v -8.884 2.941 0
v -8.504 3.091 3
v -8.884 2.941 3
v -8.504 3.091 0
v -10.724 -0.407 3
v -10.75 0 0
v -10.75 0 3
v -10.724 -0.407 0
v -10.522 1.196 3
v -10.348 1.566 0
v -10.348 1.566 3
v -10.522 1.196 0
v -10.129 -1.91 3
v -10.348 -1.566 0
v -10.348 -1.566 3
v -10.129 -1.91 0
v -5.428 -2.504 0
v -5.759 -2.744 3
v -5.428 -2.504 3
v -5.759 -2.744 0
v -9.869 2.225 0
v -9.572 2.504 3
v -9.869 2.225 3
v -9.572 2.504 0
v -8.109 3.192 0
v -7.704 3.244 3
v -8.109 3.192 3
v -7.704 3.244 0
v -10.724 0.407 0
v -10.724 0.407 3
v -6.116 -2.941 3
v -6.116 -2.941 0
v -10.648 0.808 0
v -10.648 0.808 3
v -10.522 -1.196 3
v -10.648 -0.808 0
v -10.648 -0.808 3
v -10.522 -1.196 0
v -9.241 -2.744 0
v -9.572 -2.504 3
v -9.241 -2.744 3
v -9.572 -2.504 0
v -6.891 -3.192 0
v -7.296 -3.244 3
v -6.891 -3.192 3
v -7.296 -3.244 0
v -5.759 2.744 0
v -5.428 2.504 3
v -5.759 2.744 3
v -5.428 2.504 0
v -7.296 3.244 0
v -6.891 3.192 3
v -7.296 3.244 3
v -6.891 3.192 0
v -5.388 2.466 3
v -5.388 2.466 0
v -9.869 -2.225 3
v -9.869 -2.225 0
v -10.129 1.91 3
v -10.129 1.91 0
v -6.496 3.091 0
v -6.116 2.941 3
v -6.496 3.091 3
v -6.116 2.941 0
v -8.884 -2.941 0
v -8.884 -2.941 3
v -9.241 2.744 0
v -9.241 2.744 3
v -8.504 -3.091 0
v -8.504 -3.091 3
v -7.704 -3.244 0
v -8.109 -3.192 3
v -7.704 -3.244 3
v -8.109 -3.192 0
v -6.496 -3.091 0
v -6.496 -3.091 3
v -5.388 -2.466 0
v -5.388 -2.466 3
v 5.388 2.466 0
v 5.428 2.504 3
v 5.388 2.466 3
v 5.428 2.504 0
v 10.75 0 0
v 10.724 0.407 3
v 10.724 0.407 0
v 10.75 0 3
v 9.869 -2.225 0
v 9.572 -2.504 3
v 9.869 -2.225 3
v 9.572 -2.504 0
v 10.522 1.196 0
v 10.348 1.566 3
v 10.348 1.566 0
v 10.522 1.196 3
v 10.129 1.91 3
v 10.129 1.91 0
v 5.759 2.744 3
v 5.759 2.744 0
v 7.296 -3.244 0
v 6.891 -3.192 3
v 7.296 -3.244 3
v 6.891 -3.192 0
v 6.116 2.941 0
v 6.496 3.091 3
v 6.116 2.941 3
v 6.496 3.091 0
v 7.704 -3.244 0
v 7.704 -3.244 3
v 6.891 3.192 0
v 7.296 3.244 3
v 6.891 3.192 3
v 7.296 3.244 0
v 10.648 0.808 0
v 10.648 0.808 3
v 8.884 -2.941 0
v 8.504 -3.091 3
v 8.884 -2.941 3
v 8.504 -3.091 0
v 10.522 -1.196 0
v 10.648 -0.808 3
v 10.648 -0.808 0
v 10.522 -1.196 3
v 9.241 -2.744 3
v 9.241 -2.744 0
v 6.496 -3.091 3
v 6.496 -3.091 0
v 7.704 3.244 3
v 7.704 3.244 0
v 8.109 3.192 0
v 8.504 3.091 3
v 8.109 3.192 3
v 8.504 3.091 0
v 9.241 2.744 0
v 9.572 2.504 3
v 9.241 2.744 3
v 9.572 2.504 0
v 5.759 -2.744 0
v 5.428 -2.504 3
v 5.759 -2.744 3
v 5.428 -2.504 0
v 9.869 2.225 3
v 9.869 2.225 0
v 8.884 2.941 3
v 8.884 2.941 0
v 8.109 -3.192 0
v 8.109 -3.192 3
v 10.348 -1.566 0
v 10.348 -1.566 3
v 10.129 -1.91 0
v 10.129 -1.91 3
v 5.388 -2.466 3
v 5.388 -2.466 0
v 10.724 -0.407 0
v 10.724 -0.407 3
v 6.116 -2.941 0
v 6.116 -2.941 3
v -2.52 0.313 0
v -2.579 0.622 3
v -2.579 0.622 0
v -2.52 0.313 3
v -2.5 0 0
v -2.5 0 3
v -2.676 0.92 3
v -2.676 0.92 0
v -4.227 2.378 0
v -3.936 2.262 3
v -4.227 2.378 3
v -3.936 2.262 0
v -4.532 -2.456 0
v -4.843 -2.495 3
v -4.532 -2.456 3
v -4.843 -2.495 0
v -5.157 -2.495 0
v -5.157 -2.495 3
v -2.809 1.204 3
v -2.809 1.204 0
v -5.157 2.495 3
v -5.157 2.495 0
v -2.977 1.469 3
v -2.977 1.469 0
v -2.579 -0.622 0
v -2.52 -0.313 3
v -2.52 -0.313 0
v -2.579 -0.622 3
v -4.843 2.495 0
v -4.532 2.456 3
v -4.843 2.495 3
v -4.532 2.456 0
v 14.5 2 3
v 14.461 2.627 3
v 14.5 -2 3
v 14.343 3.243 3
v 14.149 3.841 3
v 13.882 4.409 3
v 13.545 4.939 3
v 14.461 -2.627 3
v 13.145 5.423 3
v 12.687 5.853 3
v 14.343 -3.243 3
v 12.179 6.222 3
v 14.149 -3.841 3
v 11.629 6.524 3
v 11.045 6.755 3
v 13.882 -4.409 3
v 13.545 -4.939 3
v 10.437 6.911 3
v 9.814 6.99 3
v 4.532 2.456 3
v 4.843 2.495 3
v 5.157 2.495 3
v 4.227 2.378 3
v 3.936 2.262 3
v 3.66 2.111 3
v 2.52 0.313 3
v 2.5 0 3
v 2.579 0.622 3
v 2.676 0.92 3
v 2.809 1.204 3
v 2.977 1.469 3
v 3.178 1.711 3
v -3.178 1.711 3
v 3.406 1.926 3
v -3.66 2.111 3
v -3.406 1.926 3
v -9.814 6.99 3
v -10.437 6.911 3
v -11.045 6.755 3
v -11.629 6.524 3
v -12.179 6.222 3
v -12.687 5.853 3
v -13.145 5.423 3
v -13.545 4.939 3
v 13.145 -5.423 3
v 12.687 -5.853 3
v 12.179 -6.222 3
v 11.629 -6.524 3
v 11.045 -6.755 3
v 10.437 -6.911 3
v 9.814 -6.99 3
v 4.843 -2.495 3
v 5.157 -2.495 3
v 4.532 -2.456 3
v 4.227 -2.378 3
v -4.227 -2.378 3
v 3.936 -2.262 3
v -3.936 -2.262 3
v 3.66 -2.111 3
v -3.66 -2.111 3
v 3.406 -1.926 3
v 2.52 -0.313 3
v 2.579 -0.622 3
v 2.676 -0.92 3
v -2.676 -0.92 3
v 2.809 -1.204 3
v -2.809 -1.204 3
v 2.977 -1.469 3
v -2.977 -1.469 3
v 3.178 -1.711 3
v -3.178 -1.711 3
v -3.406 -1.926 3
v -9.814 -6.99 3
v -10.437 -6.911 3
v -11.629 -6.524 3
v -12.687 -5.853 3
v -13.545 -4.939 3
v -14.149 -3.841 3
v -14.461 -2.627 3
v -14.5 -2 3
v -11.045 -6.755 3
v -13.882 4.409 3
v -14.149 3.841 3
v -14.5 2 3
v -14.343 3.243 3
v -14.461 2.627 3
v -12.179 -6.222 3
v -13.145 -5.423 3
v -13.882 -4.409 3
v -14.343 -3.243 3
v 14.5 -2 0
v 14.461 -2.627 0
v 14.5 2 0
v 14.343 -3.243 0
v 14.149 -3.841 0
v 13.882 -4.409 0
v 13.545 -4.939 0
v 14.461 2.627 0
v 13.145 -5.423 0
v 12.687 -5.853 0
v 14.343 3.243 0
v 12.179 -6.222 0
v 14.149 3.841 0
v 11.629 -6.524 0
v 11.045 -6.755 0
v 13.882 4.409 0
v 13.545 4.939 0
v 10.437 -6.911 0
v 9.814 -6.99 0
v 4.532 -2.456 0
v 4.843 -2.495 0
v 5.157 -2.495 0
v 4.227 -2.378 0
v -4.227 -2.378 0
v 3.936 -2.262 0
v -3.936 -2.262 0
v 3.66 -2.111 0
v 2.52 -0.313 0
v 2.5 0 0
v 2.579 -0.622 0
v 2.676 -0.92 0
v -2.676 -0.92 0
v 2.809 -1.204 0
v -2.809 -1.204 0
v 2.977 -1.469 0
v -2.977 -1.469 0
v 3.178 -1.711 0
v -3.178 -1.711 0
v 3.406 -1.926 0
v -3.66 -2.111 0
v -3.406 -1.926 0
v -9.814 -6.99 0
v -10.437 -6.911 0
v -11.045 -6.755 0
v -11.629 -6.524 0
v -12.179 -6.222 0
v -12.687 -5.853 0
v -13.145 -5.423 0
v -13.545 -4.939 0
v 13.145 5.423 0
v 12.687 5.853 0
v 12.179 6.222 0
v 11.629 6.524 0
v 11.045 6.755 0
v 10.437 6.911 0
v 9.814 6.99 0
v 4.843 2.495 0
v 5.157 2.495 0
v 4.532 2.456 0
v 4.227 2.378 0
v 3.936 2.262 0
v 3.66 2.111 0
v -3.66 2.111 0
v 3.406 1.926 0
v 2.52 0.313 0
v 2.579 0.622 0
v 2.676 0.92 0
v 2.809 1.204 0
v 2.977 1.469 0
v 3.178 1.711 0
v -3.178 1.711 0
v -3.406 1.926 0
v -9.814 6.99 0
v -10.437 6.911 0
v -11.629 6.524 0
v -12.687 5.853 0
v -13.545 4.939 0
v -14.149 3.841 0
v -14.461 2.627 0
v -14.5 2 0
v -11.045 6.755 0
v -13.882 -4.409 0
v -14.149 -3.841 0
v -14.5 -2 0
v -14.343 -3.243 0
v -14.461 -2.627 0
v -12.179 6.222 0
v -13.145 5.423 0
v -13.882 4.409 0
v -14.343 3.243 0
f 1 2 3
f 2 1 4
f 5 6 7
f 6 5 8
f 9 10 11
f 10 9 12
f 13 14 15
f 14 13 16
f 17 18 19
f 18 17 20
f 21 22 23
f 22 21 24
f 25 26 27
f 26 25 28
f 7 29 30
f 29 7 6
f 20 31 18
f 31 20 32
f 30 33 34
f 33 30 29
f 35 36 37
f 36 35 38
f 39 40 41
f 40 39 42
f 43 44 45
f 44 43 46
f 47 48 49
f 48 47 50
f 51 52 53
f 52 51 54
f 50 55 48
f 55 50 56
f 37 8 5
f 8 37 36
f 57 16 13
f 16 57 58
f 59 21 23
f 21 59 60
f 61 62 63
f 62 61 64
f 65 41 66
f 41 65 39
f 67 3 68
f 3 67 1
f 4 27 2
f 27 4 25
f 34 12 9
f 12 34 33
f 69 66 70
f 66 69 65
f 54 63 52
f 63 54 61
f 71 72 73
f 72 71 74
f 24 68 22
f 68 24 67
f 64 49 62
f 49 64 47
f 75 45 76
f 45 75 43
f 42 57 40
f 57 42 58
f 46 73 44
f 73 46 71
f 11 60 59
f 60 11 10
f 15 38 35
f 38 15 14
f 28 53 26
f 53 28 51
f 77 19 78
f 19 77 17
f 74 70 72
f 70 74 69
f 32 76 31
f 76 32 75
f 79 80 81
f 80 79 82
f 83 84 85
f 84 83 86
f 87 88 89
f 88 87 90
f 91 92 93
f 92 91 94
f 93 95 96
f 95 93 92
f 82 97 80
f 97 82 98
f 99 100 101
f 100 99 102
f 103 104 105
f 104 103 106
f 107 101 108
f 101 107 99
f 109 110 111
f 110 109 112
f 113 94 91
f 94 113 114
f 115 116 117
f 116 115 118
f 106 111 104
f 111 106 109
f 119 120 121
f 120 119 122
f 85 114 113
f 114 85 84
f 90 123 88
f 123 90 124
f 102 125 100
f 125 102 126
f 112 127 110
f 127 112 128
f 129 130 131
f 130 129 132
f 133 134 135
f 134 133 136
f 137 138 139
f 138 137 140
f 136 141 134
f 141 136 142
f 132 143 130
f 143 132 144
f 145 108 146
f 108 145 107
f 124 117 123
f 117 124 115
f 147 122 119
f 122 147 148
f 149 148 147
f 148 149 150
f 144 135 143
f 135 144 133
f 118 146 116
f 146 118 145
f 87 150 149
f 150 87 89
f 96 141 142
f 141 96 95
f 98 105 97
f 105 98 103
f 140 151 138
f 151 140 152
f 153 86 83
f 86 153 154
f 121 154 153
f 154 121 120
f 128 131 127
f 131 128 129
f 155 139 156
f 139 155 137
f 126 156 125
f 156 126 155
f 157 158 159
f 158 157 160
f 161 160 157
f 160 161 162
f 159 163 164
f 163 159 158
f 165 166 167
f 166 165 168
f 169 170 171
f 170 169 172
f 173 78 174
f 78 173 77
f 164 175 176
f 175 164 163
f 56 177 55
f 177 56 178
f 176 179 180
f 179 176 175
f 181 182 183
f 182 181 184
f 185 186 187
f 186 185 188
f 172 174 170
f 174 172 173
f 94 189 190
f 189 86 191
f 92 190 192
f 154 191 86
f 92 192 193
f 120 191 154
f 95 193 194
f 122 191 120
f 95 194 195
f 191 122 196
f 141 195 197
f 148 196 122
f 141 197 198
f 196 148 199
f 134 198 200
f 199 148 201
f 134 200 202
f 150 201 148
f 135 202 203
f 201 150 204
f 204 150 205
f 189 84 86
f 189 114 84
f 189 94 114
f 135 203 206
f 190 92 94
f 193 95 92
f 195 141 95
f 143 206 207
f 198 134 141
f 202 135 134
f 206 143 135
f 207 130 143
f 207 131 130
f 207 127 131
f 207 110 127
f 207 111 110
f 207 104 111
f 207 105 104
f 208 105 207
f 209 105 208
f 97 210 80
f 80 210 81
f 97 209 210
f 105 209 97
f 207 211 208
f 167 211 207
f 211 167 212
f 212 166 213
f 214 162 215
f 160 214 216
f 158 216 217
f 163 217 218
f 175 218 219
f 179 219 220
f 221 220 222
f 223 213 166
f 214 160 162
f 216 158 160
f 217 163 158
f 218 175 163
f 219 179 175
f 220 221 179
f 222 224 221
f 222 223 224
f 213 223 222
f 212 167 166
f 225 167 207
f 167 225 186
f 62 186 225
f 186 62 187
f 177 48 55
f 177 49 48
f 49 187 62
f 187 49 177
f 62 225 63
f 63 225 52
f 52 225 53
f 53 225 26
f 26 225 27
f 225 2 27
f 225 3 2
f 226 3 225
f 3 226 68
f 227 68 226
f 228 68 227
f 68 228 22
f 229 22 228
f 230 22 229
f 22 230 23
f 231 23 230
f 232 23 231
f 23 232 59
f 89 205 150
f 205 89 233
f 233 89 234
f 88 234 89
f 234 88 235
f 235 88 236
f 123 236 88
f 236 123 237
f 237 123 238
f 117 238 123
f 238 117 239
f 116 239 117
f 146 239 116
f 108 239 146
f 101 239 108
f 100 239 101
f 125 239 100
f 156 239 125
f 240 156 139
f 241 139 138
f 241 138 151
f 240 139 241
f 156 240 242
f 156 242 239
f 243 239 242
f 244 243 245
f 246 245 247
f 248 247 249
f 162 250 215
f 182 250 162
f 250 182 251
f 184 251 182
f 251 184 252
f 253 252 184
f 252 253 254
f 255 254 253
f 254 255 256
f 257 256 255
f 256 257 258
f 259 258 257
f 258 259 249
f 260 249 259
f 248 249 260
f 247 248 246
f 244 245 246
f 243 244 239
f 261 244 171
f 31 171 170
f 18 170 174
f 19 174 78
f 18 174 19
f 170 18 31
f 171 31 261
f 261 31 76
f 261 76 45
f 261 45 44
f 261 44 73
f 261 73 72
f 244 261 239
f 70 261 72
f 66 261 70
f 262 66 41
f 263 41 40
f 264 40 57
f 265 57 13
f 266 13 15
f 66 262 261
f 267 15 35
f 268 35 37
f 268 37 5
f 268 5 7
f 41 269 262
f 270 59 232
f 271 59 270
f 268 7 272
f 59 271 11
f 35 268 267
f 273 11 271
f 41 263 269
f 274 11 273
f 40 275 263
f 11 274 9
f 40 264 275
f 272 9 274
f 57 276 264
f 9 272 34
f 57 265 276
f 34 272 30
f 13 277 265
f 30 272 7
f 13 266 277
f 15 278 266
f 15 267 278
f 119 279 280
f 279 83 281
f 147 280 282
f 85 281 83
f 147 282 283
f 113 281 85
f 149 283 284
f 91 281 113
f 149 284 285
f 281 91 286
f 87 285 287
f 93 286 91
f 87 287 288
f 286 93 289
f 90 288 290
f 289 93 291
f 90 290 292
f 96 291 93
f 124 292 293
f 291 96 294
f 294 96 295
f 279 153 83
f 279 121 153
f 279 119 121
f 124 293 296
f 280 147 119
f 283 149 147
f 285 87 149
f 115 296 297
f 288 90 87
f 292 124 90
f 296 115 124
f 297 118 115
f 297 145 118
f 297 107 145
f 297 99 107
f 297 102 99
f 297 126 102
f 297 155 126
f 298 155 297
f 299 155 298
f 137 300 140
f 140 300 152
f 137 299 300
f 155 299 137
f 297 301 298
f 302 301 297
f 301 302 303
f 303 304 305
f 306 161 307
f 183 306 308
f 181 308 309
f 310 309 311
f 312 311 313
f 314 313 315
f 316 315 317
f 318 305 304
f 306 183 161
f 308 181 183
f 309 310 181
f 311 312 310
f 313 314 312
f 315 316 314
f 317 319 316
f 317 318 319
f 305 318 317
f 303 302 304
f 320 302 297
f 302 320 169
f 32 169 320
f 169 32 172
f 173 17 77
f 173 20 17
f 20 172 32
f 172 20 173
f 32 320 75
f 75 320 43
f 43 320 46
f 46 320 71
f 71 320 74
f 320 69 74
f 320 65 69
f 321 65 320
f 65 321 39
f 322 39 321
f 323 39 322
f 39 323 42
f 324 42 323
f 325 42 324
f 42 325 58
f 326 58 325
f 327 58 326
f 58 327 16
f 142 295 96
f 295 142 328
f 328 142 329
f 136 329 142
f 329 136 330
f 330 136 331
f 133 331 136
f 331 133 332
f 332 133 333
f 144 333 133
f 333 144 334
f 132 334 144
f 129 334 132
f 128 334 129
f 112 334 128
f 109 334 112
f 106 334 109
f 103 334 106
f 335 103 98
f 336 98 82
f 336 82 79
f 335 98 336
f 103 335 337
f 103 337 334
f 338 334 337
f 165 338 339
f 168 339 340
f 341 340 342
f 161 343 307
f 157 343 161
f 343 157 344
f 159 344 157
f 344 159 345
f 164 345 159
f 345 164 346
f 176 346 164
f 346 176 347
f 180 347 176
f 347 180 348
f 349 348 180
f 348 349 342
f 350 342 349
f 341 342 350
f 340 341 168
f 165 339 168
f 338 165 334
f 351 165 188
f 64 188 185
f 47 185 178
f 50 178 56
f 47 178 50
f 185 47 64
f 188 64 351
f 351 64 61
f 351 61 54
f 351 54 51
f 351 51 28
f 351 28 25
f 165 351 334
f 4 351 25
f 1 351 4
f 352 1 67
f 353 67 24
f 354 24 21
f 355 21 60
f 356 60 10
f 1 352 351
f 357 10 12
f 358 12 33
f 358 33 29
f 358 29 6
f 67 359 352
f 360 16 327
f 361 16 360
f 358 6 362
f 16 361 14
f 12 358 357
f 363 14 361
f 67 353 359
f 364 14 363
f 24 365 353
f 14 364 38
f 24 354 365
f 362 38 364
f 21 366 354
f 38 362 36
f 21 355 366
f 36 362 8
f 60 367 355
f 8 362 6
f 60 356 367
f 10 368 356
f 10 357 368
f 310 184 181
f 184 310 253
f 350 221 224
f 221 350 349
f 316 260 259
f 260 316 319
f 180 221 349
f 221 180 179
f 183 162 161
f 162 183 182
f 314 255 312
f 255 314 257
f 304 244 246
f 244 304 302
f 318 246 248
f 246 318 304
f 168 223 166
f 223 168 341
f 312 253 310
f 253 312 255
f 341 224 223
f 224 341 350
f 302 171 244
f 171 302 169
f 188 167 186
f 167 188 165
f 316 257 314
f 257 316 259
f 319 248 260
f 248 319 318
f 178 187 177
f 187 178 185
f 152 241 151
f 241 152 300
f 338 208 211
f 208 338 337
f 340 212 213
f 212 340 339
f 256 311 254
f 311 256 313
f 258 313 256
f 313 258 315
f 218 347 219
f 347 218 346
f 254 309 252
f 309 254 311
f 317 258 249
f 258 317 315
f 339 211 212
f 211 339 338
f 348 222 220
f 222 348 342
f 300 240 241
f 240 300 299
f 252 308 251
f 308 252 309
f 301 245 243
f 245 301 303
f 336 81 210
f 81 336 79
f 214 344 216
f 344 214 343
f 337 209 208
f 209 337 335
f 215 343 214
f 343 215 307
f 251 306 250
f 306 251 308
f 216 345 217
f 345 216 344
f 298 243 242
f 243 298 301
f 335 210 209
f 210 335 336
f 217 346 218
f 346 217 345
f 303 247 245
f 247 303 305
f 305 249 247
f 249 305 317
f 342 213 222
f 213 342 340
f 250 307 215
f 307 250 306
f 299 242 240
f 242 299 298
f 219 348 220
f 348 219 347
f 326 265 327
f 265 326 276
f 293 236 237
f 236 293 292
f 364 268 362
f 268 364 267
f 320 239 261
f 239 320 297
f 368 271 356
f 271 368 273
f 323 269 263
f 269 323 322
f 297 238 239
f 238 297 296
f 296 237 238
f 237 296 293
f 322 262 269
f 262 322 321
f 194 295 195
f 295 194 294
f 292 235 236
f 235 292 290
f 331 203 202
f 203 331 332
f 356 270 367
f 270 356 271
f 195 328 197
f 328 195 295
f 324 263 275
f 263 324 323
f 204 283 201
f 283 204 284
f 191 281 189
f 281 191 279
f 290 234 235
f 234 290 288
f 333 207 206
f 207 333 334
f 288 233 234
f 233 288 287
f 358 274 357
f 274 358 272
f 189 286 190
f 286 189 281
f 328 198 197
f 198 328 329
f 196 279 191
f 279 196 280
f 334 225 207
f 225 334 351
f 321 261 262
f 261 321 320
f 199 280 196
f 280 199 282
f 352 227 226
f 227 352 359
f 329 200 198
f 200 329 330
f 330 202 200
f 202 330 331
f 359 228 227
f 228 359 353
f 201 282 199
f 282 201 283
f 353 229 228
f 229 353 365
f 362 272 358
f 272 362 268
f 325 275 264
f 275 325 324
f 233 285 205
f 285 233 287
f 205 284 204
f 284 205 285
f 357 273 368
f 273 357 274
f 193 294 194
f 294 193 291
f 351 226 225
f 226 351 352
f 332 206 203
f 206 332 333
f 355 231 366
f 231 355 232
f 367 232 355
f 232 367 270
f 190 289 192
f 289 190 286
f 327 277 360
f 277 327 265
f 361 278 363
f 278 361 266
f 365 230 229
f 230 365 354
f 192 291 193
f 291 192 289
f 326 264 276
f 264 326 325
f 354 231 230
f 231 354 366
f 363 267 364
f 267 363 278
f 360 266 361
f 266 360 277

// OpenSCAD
$fn = 50;

difference() {
	union() {
		hull() {
			translate(v = [-9.5, 2.0, 0]) {
				cylinder(h = 3, r = 5);
			}
			translate(v = [9.5, 2.0, 0]) {
				cylinder(h = 3, r = 5);
			}
			translate(v = [-9.5, -2.0, 0]) {
				cylinder(h = 3, r = 5);
			}
			translate(v = [9.5, -2.0, 0]) {
				cylinder(h = 3, r = 5);
			}
		}
	}
	union() {
		translate(v = [-7.5, 0.0, -100.0]) {
			cylinder(h = 200, r = 3.25);
		}
		translate(v = [7.5, 0.0, -100.0]) {
			cylinder(h = 200, r = 3.25);
		}
		translate(v = [-7.5, 0.0, -100.0]) {
			cylinder(h = 200, r = 1.8);
		}
		translate(v = [7.5, 0.0, -100.0]) {
			cylinder(h = 200, r = 1.8);
		}
		translate(v = [-5.0, 0, 0.0]) {
			cylinder(h = 3, r = 2.5);
		}
		translate(v = [5.0, 0, 0.0]) {
			cylinder(h = 3, r = 2.5);
		}
	}
}
